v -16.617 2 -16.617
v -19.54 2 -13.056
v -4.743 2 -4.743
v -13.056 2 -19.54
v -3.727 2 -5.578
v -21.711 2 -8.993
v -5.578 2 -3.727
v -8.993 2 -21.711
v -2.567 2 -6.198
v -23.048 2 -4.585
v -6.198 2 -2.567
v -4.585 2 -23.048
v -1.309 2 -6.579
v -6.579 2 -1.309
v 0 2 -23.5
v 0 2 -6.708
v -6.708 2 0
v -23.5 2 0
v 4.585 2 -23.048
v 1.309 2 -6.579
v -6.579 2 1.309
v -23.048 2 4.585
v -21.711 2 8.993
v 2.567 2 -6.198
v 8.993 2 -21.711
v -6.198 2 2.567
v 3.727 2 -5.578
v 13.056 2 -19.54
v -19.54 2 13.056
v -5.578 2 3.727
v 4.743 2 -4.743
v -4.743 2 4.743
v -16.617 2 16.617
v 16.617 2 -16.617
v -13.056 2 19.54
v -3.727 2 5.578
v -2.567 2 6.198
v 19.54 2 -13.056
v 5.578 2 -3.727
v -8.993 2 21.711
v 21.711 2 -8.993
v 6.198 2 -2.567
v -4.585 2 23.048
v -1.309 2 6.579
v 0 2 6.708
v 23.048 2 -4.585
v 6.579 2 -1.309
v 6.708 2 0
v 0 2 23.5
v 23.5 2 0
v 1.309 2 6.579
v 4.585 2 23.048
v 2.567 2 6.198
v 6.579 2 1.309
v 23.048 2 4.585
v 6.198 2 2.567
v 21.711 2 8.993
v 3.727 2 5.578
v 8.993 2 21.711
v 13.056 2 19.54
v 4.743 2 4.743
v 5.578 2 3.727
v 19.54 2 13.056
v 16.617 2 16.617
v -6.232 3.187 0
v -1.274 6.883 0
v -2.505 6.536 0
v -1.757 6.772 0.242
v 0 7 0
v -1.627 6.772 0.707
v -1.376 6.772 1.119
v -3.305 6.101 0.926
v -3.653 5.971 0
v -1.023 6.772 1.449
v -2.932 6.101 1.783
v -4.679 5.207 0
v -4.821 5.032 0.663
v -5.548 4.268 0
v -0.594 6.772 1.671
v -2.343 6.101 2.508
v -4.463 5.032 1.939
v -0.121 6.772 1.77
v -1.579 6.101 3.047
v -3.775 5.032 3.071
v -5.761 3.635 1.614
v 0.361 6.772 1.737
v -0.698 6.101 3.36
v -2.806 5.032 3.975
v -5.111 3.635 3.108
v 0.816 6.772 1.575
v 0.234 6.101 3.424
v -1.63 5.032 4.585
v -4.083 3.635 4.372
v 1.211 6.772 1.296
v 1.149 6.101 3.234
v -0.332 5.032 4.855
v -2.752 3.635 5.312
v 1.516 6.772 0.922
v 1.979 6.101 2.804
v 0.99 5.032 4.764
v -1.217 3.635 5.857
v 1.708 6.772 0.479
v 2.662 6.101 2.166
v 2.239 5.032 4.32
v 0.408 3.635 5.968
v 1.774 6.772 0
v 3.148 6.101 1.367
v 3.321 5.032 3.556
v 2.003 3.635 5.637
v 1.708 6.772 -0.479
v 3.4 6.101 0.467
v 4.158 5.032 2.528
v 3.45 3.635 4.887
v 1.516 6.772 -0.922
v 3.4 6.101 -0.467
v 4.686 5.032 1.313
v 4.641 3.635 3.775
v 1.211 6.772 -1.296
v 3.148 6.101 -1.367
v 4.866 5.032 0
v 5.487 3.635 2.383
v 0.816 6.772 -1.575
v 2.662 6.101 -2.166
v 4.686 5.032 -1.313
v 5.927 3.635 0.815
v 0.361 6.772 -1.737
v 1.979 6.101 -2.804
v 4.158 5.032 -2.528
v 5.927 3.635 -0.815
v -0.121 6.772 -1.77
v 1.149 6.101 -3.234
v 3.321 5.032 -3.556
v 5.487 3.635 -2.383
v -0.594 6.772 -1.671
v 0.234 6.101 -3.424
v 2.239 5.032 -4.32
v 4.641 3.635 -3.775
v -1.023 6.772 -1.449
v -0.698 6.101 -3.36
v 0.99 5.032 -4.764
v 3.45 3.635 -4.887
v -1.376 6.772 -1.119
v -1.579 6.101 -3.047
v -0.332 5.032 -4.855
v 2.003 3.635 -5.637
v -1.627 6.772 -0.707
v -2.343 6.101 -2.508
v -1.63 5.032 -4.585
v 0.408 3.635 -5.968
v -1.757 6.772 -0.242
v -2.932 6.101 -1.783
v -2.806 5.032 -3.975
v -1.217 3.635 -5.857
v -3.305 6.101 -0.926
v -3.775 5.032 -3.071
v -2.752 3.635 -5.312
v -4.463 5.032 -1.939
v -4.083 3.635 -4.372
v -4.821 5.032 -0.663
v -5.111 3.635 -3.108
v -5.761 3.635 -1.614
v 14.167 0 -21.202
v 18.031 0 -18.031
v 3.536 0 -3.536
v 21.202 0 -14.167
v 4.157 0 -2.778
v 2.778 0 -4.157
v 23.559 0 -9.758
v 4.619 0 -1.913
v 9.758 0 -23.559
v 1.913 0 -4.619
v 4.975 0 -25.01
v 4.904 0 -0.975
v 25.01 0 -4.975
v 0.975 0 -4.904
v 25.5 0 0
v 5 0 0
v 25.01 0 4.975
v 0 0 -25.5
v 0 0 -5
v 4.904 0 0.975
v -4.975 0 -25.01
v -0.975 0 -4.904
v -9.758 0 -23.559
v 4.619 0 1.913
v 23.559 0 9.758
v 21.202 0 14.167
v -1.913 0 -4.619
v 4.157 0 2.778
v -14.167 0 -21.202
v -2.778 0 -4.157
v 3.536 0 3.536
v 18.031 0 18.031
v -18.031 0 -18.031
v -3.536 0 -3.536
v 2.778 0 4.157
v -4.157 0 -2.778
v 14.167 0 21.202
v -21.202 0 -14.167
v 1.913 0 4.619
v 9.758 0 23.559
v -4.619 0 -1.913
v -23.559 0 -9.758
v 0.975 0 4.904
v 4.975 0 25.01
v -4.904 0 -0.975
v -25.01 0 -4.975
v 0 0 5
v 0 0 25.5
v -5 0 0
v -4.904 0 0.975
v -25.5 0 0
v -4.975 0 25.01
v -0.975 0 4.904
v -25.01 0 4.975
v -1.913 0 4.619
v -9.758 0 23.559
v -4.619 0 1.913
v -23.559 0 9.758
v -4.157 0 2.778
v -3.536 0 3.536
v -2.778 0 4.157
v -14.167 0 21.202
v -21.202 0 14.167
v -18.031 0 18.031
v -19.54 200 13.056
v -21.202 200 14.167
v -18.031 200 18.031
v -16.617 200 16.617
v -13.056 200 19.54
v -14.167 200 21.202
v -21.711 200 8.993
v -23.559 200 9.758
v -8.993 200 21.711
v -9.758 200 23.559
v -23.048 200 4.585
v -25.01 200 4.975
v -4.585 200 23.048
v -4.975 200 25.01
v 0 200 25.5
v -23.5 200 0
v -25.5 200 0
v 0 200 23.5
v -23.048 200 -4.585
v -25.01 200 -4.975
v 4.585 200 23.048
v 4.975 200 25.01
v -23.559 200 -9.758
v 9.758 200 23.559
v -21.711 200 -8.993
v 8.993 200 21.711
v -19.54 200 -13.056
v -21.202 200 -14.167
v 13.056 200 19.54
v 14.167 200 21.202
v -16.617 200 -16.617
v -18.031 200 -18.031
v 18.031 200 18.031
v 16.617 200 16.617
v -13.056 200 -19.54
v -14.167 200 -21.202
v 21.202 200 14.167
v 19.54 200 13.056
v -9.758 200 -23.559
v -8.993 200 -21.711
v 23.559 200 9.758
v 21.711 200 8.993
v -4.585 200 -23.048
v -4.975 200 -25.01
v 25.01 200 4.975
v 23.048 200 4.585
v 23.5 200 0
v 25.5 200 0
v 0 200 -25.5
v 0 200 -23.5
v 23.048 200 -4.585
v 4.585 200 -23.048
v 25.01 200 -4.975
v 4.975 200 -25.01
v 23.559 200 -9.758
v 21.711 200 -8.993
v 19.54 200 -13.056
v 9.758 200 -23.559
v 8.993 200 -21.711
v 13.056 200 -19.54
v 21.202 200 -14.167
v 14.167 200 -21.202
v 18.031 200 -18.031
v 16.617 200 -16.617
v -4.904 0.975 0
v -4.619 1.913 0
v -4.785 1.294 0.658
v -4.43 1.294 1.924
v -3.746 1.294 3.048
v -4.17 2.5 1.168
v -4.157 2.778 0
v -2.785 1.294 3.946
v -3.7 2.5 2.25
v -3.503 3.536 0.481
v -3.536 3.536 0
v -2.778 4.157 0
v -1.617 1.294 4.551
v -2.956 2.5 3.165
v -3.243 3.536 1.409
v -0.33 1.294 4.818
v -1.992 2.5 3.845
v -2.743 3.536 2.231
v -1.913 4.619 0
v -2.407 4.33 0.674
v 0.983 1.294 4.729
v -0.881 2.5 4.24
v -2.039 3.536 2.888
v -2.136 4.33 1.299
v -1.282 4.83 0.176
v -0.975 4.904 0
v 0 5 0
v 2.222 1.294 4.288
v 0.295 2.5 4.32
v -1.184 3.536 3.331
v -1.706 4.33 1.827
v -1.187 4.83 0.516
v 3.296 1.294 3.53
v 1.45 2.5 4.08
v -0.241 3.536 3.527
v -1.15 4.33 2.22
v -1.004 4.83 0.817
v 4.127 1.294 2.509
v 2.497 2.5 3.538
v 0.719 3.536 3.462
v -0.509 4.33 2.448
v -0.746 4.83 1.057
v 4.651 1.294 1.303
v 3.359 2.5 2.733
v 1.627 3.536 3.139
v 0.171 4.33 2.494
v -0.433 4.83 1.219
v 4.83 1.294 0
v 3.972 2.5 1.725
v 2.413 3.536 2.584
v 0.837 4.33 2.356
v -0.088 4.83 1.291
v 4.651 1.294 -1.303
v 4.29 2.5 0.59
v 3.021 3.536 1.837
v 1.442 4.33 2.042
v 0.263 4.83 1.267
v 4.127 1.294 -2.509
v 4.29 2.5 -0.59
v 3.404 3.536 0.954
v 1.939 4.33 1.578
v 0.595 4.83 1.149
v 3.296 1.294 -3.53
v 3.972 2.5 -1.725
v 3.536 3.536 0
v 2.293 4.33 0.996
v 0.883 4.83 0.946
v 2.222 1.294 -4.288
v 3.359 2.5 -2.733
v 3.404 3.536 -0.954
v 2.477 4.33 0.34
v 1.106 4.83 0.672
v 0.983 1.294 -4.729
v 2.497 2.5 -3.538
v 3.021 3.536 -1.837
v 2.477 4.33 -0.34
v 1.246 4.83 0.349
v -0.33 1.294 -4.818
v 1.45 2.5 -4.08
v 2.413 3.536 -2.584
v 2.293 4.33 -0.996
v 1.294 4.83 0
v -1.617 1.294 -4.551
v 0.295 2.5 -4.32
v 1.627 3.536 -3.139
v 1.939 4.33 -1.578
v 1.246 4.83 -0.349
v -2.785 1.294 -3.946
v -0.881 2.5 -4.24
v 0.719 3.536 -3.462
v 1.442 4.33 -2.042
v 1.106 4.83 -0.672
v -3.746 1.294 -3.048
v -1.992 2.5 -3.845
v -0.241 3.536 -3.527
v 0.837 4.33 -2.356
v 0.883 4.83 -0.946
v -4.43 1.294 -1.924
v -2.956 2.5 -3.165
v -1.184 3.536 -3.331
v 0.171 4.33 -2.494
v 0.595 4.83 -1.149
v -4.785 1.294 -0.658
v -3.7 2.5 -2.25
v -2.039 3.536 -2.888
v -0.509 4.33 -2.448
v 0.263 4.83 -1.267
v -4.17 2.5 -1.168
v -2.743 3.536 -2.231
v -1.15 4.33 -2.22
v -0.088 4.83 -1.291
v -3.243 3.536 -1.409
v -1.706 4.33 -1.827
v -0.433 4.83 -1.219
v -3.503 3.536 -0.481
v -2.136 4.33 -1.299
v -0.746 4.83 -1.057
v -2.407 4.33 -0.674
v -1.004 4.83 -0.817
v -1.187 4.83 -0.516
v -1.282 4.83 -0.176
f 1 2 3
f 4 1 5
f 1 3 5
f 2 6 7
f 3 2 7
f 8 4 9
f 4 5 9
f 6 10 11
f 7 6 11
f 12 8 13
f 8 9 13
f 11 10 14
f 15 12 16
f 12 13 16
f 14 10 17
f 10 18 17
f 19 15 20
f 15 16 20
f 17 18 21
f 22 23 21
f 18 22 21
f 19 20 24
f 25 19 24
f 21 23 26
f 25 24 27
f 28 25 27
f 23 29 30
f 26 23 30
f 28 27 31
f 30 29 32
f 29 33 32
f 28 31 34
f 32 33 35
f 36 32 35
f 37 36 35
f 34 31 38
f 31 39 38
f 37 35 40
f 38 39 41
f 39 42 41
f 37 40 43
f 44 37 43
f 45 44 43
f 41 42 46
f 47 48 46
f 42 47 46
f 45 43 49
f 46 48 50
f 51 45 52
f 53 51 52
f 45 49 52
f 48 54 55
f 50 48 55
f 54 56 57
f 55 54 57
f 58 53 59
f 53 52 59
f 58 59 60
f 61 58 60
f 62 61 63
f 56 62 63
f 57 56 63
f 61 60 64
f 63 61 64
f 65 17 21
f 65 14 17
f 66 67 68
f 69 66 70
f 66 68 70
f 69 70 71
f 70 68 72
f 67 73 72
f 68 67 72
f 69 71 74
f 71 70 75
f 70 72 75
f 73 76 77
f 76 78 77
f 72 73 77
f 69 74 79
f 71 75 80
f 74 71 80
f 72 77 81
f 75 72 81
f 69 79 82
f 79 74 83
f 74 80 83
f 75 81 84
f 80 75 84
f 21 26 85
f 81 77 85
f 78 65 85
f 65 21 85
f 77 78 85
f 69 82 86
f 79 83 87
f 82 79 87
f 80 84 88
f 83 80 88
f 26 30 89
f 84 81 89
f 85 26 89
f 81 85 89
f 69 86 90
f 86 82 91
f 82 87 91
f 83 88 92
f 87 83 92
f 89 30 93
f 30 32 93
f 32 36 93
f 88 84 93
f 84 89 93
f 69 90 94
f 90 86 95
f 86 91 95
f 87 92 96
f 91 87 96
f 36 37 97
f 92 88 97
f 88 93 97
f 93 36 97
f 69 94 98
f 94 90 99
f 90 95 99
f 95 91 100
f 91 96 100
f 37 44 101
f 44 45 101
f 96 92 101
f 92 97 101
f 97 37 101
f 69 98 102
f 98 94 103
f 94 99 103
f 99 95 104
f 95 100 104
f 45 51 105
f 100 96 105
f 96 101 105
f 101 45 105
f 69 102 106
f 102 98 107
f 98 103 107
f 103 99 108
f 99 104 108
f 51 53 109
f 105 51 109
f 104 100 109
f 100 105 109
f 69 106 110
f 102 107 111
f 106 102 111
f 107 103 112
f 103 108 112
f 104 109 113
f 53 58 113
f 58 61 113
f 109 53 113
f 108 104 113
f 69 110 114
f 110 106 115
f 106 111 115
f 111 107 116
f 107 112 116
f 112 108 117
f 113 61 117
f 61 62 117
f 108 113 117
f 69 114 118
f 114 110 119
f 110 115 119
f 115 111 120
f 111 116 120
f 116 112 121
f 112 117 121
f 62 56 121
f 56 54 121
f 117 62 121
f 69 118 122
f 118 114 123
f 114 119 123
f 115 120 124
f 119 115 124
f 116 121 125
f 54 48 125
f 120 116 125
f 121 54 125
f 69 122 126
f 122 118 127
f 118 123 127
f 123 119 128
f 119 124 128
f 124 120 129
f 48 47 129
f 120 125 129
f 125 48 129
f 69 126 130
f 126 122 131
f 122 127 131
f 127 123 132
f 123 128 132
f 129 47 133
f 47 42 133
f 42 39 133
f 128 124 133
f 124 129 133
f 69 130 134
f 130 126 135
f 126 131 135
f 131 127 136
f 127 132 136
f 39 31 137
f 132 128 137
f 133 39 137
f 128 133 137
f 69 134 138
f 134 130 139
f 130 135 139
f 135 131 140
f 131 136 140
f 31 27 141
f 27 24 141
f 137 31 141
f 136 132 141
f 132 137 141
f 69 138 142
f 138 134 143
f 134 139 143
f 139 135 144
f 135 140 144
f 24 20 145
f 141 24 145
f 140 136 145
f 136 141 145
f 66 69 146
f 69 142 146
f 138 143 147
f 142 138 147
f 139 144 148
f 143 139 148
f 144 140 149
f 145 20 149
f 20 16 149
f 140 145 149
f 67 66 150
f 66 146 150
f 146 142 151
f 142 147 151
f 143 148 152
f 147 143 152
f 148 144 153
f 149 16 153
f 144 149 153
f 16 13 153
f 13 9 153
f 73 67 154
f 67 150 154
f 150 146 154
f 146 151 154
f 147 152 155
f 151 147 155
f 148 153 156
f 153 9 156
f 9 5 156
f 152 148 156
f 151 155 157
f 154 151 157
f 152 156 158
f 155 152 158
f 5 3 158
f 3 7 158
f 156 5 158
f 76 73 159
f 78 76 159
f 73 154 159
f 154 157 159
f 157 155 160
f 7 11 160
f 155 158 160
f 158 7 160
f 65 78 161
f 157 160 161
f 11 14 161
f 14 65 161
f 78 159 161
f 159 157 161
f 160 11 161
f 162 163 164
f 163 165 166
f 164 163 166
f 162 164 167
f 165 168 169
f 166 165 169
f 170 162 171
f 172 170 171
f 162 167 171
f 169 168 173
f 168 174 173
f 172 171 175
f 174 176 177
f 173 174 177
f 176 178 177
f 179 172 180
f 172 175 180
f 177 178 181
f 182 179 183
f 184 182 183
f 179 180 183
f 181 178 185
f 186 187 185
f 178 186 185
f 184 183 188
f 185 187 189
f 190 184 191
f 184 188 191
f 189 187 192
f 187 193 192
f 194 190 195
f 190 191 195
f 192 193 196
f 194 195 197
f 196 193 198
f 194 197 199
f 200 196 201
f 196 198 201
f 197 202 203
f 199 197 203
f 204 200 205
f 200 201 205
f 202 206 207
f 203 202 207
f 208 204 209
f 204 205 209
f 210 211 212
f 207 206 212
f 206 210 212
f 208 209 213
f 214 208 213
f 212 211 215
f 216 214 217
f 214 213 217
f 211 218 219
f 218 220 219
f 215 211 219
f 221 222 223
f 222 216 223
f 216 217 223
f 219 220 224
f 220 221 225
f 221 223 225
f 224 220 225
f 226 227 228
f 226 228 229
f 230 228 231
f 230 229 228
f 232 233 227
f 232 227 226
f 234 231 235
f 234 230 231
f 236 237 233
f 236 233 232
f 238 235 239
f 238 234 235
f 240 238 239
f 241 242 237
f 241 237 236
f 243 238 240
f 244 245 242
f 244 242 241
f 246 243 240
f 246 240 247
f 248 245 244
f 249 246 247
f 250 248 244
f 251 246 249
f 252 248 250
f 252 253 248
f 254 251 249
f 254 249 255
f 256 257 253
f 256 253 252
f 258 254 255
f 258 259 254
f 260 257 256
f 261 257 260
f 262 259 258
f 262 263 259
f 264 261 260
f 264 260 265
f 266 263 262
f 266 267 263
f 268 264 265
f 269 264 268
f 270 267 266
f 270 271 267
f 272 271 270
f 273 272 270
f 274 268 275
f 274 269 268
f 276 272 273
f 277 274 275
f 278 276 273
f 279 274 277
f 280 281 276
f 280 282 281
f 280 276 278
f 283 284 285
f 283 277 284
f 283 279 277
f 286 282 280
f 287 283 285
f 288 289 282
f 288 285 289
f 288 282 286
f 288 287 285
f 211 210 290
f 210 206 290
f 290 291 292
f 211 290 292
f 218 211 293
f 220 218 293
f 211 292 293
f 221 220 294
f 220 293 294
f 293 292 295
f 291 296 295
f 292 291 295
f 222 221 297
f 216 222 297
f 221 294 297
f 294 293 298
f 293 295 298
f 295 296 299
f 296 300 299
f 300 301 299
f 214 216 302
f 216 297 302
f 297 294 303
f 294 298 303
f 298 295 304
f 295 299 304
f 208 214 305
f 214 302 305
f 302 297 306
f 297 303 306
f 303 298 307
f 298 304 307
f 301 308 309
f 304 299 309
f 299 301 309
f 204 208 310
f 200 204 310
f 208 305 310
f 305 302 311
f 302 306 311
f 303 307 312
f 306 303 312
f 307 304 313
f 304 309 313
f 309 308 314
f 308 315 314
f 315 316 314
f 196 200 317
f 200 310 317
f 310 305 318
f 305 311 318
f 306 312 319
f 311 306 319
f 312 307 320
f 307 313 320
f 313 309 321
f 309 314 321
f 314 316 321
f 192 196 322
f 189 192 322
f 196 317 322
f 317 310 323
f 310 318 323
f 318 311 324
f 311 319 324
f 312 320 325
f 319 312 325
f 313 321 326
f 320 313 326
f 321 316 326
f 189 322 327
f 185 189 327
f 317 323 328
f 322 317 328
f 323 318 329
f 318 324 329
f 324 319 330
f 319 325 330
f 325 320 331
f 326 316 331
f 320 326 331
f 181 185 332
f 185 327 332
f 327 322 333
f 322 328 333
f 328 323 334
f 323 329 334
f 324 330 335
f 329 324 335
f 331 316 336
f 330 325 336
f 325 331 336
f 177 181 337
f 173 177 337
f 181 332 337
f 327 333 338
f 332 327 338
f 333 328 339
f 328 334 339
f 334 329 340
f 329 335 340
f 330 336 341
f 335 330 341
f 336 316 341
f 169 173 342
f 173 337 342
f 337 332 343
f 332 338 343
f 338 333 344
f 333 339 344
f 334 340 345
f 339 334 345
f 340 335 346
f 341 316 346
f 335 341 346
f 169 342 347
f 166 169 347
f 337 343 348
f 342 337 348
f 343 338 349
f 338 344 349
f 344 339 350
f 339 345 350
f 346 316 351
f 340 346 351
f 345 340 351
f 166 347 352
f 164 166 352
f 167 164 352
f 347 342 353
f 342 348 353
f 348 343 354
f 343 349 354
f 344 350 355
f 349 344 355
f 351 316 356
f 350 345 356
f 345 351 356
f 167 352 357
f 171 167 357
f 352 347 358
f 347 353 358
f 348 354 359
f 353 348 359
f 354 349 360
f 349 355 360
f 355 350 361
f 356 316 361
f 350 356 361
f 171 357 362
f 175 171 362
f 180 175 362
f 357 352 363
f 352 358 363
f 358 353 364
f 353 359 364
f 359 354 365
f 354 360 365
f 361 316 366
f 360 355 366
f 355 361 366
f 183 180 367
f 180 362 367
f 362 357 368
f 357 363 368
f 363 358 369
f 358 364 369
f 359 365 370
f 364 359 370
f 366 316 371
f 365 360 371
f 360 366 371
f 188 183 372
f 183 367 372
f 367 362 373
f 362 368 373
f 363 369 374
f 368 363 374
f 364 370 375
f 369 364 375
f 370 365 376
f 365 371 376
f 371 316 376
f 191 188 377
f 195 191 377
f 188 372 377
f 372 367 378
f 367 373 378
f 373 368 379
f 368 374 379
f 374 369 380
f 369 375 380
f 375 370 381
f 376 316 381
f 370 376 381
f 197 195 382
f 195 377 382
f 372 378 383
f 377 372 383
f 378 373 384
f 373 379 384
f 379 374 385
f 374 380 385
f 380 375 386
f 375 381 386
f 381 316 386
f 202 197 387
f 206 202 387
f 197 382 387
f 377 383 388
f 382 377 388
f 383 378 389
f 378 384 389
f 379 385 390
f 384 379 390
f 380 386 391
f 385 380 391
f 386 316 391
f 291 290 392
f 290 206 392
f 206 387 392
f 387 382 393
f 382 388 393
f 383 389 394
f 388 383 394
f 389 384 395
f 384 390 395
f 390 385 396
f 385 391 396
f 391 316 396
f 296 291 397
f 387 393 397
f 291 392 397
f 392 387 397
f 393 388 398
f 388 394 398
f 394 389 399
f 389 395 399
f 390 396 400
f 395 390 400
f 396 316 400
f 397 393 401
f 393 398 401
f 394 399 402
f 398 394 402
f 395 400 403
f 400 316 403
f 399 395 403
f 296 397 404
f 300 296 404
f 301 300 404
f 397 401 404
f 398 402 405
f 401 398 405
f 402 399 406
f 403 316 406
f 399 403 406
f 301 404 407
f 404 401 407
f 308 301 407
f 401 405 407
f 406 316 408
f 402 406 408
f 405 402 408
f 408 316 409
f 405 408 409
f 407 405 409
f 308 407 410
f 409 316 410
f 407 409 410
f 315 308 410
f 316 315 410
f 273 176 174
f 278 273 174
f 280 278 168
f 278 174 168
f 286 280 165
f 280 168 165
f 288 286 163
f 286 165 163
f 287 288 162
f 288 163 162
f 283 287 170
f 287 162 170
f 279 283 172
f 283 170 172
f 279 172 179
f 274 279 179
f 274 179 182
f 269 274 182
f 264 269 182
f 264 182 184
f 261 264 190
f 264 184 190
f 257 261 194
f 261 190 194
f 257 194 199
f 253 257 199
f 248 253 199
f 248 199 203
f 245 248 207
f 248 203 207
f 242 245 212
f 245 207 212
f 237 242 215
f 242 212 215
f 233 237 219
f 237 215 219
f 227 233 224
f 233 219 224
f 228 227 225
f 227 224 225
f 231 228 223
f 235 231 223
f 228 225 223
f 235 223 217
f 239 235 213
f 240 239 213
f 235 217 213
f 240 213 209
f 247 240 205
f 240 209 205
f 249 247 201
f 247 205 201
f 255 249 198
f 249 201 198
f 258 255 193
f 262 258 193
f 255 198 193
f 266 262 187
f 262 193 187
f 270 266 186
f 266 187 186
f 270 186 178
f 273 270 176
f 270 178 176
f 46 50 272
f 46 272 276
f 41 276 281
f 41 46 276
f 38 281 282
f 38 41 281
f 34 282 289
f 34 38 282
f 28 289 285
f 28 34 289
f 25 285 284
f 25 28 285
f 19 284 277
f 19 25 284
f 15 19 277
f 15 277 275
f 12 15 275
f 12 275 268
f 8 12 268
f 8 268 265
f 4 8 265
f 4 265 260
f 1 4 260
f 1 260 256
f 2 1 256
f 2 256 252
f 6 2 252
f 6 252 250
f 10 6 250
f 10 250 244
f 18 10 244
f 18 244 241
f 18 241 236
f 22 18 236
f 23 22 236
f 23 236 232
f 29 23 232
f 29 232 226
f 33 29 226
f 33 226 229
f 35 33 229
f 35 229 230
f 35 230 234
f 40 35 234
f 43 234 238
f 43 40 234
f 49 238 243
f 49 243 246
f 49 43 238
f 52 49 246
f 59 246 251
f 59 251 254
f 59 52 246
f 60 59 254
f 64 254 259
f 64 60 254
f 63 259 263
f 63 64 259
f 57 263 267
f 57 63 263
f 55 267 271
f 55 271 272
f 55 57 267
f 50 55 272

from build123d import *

# Parameters (mm, degrees)
SKETCH1_R           = 25.5
SKETCH1_R_2         = 23.5
BOSS_EXTRUDE1_DEPTH = 200


with BuildPart() as part:
    # Sketch1 → Boss-Extrude1 (new body)
    with BuildSketch(Plane(origin=(0, 0, 0), x_dir=(1, 0, 0), z_dir=(0, 1, 0))):
        Circle(SKETCH1_R)
        Circle(SKETCH1_R_2, mode=Mode.SUBTRACT)
    extrude(amount=BOSS_EXTRUDE1_DEPTH)

    # Sketch2 → Revolve1 (revolve)
    with BuildSketch(Plane.XY):
        with BuildLine():
            Line((-23.5, 0), (-5, 0))
            ThreePointArc((-5, 0), (-3.535533906, 3.535533906), (0, 5))
            Line((0, 5), (0, 7))
            ThreePointArc((0, 7), (-4.183300133, 5.61248608), (-6.708203932, 2))
            Line((-6.708203932, 2), (-23.5, 2))
            Line((-23.5, 2), (-23.5, 0))
        make_face()
    revolve(axis=Axis((0, 5, 0), (0, 1, 0)))


solid = part.part
